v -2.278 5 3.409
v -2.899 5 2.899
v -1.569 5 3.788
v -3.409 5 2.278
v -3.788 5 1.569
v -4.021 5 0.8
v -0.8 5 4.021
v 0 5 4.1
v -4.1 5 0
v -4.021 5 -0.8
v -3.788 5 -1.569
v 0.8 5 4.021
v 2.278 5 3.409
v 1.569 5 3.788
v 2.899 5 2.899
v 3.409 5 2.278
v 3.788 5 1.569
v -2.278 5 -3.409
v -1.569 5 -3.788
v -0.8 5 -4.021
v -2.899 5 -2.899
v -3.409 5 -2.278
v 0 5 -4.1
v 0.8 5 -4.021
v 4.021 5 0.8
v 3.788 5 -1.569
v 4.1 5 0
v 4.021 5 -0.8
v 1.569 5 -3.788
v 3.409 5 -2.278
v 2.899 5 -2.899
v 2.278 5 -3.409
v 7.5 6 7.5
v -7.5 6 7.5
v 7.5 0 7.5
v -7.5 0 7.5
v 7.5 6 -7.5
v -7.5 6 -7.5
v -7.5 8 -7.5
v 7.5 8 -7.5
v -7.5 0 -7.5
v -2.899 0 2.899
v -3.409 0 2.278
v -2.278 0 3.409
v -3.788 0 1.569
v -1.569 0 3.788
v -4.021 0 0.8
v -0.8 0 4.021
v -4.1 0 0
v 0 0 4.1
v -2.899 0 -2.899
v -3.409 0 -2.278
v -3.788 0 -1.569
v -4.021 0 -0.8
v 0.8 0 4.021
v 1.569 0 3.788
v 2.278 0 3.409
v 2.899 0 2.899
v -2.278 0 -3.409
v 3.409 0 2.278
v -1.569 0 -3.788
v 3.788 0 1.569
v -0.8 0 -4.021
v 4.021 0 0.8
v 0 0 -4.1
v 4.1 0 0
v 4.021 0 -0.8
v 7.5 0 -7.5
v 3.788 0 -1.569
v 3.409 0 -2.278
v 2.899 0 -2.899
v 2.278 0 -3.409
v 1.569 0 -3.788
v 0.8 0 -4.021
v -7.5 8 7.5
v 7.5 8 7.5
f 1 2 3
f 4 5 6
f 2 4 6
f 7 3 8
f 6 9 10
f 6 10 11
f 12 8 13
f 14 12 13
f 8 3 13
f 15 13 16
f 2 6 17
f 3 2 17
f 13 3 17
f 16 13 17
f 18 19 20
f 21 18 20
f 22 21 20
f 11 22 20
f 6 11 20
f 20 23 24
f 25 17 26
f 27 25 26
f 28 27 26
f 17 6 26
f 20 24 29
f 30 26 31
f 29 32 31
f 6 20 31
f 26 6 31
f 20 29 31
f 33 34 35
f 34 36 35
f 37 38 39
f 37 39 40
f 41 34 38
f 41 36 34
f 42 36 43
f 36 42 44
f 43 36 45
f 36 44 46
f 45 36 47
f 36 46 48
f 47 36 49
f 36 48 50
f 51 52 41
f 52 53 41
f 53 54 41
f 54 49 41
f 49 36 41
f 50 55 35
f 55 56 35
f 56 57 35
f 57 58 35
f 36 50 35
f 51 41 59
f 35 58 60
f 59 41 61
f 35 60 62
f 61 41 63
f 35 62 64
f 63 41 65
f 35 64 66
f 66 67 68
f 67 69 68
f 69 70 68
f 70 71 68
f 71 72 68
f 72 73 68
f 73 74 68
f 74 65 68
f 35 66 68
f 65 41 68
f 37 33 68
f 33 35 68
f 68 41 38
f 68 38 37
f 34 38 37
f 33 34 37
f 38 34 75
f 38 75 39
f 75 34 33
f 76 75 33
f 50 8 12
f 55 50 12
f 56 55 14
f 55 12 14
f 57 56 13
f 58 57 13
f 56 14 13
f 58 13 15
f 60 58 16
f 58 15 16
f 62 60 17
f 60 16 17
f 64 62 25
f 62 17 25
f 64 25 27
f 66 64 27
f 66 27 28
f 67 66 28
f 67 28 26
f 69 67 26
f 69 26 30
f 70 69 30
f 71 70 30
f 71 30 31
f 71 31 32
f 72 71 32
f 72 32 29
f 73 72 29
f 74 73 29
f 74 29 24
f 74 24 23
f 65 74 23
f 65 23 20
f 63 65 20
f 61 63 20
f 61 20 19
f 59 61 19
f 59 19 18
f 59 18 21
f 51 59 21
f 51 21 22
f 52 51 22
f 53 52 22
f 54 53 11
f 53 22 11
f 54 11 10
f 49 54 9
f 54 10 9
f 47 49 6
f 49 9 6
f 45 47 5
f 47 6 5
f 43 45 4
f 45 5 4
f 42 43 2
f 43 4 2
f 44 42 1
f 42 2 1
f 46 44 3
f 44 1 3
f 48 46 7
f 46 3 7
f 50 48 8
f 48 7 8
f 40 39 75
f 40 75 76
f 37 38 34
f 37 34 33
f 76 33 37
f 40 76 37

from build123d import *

# Parameters (mm, degrees)
SKETCH_1_W          = 15
SKETCH_1_H          = 15
EXTRUDE_1_DEPTH     = 5
SKETCH_2_R          = 4.1
CUT_EXTRUDE_1_DEPTH = 6
SKETCH_3_W          = 15
SKETCH_3_H          = 15
EXTRUDE_2_DEPTH     = 1
SKETCH_4_W          = 15
SKETCH_4_H          = 15
EXTRUDE_3_DEPTH     = 2


with BuildPart() as part:
    # 草图1 → 凸台-拉伸1 (new body)
    with BuildSketch(Plane(origin=(0, 0, 0), x_dir=(1, 0, 0), z_dir=(0, 1, 0))):
        Rectangle(SKETCH_1_W, SKETCH_1_H)
    extrude(amount=EXTRUDE_1_DEPTH)

    # 草图2 → 切除-拉伸1 (cut)
    with BuildSketch(Plane(origin=(0, 5, 0), x_dir=(1, 0, 0), z_dir=(0, 1, 0))):
        with Locations(Location((0, 0, 0), (0, 0, 270))):
            Circle(SKETCH_2_R)
    extrude(amount=-CUT_EXTRUDE_1_DEPTH, mode=Mode.SUBTRACT)

    # 草图3 → 凸台-拉伸2 (add)
    with BuildSketch(Plane(origin=(0, 5, 0), x_dir=(1, 0, 0), z_dir=(0, 1, 0))):
        Rectangle(SKETCH_3_W, SKETCH_3_H)
    extrude(amount=EXTRUDE_2_DEPTH)


with BuildPart() as body_2:
    # 草图4 → 凸台-拉伸3 (new body)
    with BuildSketch(Plane(origin=(0, 6, 0), x_dir=(1, 0, 0), z_dir=(0, 1, 0))):
        Rectangle(SKETCH_4_W, SKETCH_4_H)
    extrude(amount=EXTRUDE_3_DEPTH)


solid = Compound([part.part, body_2.part])
